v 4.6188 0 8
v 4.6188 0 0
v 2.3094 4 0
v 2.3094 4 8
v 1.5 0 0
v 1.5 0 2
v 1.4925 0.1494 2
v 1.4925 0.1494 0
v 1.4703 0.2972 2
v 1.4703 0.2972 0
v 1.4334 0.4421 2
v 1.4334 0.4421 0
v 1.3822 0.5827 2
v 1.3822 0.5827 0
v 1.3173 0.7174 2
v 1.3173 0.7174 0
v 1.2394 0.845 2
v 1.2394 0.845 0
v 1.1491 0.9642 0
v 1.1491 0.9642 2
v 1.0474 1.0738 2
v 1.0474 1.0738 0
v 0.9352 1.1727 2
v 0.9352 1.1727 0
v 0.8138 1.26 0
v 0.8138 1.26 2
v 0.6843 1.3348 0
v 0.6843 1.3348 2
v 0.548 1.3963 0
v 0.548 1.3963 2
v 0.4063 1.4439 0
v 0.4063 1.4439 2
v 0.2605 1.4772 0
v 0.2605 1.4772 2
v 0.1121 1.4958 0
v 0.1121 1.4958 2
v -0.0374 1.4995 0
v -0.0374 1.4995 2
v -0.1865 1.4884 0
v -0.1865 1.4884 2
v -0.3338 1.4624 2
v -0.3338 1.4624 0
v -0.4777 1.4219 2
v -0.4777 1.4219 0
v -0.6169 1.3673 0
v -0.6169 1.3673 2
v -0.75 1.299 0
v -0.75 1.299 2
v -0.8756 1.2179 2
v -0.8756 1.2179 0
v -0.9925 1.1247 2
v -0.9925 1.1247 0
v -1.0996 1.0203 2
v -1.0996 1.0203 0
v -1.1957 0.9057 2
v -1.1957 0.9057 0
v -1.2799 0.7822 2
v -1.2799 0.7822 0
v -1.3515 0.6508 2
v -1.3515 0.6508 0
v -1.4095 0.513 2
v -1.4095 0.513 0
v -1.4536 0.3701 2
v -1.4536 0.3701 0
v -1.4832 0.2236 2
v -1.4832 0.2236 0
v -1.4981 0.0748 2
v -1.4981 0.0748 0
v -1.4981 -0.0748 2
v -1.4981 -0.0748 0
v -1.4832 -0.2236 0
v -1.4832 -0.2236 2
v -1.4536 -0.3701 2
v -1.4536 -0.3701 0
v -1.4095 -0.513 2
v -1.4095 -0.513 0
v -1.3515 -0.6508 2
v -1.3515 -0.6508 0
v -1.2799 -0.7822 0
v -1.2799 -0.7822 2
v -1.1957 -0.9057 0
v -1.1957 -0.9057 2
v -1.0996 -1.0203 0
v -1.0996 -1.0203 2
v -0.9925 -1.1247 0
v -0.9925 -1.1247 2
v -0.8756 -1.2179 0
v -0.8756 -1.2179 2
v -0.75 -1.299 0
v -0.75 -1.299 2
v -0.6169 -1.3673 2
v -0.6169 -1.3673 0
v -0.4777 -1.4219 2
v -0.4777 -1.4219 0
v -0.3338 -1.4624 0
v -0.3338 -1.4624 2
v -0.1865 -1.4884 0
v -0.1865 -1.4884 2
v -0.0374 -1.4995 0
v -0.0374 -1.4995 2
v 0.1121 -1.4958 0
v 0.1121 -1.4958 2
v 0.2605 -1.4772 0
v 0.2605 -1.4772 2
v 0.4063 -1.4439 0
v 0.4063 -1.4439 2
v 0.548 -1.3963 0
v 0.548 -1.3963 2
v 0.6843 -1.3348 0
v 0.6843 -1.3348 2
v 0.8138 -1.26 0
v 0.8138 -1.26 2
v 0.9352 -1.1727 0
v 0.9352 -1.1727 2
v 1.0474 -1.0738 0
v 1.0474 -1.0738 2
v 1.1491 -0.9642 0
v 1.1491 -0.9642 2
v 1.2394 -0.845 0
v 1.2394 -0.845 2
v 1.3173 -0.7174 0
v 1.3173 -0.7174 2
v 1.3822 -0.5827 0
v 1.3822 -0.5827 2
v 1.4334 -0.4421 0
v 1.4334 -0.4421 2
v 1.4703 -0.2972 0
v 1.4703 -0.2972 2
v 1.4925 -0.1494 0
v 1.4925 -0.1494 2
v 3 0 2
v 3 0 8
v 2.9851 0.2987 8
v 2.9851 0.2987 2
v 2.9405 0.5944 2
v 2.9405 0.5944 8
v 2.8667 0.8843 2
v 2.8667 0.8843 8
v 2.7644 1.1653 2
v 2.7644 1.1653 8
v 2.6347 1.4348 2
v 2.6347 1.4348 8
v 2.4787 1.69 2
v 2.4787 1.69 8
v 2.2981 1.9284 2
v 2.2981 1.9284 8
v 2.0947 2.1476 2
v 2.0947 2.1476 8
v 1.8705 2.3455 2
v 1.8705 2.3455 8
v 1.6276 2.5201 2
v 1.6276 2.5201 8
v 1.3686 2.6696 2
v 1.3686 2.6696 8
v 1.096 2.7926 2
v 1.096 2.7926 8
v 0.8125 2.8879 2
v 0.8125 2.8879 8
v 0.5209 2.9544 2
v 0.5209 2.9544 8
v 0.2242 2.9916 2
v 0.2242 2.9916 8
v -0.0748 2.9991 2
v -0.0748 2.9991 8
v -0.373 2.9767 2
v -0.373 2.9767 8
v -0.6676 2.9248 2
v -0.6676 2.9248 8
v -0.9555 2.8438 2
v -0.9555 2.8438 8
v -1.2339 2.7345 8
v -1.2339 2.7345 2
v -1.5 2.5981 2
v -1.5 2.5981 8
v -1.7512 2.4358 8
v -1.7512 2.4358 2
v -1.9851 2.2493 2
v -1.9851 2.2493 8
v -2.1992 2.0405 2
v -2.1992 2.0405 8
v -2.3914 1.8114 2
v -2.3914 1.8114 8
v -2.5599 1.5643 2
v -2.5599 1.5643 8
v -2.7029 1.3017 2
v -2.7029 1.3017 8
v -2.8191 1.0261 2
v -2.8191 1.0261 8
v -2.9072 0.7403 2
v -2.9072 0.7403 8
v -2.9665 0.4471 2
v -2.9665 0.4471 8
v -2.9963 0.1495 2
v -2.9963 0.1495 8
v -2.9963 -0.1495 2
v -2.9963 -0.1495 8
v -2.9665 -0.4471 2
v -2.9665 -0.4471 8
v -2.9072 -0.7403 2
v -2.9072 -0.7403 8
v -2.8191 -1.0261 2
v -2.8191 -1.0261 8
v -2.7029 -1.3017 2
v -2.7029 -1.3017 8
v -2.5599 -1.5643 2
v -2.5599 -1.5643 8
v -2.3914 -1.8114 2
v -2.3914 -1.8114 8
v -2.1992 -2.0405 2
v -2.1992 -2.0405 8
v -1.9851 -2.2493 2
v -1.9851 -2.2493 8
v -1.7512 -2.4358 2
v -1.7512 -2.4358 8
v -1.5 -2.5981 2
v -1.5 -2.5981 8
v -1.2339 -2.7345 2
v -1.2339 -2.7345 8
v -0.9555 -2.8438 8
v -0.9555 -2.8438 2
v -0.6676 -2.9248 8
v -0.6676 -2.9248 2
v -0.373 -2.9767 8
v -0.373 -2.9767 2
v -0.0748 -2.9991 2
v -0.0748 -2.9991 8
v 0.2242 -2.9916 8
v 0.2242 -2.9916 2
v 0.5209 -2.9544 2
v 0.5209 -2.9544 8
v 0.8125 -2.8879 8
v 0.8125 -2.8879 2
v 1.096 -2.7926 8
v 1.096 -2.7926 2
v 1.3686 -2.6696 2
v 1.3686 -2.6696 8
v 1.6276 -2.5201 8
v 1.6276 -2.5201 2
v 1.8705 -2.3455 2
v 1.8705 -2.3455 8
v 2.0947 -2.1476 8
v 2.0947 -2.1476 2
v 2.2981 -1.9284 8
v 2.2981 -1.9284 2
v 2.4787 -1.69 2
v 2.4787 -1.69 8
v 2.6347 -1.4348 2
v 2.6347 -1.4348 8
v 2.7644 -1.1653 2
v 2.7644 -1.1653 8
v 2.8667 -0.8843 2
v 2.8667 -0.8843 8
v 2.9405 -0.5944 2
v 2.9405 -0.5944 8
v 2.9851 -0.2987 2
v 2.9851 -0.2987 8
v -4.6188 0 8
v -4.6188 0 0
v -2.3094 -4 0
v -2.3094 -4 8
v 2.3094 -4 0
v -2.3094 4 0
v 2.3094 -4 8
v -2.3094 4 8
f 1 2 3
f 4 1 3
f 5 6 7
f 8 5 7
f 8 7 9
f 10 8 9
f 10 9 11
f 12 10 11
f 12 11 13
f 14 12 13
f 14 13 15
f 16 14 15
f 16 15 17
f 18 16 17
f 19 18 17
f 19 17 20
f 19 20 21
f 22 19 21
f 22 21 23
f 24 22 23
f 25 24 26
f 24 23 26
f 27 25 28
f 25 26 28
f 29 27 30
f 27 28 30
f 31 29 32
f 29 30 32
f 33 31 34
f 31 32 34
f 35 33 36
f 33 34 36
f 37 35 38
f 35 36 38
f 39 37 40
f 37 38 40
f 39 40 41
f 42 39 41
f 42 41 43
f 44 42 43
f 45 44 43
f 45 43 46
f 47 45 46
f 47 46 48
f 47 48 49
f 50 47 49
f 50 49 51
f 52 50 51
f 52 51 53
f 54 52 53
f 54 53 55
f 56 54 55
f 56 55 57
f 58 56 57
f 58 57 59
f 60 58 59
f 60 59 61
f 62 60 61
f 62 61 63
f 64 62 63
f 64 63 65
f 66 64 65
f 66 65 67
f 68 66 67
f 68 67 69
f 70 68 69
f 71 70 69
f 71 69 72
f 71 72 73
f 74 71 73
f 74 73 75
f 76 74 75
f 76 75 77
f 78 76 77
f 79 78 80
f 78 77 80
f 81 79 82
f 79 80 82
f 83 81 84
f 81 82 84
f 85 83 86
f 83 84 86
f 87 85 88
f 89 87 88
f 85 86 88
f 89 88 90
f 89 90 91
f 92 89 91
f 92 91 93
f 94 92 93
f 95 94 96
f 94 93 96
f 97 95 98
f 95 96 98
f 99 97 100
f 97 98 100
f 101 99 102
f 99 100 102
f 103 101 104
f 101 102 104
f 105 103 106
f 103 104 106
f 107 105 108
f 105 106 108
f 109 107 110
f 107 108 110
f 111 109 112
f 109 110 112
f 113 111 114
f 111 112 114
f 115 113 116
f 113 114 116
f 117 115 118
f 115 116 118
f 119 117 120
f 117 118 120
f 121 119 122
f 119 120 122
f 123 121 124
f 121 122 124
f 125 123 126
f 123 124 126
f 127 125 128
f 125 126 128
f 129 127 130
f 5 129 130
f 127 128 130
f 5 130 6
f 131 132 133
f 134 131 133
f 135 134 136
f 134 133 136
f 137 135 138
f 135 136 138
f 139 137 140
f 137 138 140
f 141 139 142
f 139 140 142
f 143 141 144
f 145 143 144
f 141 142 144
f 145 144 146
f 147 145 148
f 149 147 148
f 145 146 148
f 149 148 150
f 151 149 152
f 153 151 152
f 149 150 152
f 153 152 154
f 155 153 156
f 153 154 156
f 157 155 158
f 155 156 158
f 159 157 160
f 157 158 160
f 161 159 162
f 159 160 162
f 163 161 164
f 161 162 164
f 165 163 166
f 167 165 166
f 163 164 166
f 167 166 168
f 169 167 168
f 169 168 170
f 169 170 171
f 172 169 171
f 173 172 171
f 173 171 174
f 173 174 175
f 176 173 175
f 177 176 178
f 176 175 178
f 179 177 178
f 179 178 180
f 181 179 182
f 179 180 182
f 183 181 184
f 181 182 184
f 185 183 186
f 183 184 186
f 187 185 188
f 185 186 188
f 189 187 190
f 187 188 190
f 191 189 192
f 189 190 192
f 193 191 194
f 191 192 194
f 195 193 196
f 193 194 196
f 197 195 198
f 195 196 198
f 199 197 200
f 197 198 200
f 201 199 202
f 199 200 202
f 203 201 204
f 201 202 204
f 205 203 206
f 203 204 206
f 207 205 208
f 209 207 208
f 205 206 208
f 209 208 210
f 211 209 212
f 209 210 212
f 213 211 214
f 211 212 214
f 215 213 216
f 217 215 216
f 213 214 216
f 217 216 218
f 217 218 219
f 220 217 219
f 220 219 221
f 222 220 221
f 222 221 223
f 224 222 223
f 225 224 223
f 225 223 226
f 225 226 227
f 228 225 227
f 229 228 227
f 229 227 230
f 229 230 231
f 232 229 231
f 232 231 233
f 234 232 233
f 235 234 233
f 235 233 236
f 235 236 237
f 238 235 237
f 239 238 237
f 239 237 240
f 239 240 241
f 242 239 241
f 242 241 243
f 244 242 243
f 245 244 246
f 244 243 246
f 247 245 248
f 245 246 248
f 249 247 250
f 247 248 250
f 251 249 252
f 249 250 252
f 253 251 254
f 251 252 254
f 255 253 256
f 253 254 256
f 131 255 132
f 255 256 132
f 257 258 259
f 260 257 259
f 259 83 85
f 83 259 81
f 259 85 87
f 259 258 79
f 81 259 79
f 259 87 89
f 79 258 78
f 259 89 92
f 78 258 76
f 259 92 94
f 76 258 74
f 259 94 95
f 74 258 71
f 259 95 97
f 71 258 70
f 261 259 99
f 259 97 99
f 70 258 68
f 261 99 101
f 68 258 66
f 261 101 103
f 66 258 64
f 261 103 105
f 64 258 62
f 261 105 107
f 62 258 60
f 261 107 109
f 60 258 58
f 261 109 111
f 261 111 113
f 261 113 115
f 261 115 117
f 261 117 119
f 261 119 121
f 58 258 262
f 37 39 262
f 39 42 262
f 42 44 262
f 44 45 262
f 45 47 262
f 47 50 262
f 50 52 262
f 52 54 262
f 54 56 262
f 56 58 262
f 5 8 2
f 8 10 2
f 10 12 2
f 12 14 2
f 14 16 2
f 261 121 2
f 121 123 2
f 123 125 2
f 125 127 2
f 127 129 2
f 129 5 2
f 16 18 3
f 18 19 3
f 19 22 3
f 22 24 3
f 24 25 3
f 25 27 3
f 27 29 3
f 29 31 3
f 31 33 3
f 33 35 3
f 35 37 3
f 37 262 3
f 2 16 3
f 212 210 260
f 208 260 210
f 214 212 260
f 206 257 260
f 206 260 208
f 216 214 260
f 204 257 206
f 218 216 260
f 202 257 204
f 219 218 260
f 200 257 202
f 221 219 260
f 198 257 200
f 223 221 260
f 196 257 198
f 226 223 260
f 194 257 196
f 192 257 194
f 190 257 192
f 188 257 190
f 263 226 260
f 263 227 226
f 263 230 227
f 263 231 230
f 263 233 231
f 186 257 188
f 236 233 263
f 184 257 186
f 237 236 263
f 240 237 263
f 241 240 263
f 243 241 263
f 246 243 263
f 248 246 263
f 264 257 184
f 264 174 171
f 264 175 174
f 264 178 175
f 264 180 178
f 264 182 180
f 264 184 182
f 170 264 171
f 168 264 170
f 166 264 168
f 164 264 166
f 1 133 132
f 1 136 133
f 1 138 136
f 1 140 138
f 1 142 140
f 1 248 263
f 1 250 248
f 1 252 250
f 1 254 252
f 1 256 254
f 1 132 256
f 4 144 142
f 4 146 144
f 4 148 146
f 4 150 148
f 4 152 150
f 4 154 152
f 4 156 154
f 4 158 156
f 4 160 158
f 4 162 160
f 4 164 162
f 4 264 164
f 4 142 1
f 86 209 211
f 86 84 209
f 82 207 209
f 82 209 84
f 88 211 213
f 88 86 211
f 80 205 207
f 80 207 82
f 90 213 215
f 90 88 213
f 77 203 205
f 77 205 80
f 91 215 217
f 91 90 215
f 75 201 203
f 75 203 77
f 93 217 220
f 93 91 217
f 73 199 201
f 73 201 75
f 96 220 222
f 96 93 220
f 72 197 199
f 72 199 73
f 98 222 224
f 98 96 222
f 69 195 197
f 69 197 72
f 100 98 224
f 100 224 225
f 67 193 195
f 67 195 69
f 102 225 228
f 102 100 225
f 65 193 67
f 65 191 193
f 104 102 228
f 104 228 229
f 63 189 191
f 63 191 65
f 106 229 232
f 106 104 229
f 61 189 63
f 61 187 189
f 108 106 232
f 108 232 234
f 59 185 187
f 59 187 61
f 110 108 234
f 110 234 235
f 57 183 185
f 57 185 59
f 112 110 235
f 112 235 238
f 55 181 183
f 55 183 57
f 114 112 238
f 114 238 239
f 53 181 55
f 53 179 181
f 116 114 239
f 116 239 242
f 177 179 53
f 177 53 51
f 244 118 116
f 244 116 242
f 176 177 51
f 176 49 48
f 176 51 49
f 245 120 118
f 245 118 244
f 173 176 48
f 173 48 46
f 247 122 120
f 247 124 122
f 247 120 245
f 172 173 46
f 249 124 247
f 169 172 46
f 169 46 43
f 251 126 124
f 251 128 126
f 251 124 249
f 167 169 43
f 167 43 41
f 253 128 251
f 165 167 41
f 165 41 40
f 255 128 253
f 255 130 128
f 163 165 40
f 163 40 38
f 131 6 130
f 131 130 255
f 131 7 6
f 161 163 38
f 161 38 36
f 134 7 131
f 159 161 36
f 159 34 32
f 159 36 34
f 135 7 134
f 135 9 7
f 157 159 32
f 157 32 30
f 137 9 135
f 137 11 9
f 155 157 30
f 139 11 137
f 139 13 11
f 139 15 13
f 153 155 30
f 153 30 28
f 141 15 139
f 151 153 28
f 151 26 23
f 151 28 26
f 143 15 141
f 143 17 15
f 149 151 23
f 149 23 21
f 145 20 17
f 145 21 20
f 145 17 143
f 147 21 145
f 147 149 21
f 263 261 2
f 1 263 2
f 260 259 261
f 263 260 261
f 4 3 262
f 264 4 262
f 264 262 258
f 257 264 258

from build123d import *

# Parameters (mm, degrees)
BOSS_EXTRUDE1_DEPTH = 8
SKETCH2_R           = 1.5
CUT_EXTRUDE1_DEPTH  = 11.066445914
SKETCH3_R           = 3
CUT_EXTRUDE2_DEPTH  = 6


with BuildPart() as part:
    # Sketch1 → Boss-Extrude1 (new body)
    with BuildSketch(Plane.XY):
        Polygon((-2.309401077, 4), (-4.618802154, 0), (-2.309401077, -4), (2.309401077, -4), (4.618802154, 0), (2.309401077, 4), align=None)
    extrude(amount=BOSS_EXTRUDE1_DEPTH)

    # Sketch2 → Cut-Extrude1 (cut, through all)
    with BuildSketch(Plane.XY.offset(8)):
        Circle(SKETCH2_R)
    extrude(amount=-CUT_EXTRUDE1_DEPTH, mode=Mode.SUBTRACT)

    # Sketch3 → Cut-Extrude2 (cut)
    with BuildSketch(Plane.XY.offset(8)):
        Circle(SKETCH3_R)
    extrude(amount=-CUT_EXTRUDE2_DEPTH, mode=Mode.SUBTRACT)


solid = part.part
